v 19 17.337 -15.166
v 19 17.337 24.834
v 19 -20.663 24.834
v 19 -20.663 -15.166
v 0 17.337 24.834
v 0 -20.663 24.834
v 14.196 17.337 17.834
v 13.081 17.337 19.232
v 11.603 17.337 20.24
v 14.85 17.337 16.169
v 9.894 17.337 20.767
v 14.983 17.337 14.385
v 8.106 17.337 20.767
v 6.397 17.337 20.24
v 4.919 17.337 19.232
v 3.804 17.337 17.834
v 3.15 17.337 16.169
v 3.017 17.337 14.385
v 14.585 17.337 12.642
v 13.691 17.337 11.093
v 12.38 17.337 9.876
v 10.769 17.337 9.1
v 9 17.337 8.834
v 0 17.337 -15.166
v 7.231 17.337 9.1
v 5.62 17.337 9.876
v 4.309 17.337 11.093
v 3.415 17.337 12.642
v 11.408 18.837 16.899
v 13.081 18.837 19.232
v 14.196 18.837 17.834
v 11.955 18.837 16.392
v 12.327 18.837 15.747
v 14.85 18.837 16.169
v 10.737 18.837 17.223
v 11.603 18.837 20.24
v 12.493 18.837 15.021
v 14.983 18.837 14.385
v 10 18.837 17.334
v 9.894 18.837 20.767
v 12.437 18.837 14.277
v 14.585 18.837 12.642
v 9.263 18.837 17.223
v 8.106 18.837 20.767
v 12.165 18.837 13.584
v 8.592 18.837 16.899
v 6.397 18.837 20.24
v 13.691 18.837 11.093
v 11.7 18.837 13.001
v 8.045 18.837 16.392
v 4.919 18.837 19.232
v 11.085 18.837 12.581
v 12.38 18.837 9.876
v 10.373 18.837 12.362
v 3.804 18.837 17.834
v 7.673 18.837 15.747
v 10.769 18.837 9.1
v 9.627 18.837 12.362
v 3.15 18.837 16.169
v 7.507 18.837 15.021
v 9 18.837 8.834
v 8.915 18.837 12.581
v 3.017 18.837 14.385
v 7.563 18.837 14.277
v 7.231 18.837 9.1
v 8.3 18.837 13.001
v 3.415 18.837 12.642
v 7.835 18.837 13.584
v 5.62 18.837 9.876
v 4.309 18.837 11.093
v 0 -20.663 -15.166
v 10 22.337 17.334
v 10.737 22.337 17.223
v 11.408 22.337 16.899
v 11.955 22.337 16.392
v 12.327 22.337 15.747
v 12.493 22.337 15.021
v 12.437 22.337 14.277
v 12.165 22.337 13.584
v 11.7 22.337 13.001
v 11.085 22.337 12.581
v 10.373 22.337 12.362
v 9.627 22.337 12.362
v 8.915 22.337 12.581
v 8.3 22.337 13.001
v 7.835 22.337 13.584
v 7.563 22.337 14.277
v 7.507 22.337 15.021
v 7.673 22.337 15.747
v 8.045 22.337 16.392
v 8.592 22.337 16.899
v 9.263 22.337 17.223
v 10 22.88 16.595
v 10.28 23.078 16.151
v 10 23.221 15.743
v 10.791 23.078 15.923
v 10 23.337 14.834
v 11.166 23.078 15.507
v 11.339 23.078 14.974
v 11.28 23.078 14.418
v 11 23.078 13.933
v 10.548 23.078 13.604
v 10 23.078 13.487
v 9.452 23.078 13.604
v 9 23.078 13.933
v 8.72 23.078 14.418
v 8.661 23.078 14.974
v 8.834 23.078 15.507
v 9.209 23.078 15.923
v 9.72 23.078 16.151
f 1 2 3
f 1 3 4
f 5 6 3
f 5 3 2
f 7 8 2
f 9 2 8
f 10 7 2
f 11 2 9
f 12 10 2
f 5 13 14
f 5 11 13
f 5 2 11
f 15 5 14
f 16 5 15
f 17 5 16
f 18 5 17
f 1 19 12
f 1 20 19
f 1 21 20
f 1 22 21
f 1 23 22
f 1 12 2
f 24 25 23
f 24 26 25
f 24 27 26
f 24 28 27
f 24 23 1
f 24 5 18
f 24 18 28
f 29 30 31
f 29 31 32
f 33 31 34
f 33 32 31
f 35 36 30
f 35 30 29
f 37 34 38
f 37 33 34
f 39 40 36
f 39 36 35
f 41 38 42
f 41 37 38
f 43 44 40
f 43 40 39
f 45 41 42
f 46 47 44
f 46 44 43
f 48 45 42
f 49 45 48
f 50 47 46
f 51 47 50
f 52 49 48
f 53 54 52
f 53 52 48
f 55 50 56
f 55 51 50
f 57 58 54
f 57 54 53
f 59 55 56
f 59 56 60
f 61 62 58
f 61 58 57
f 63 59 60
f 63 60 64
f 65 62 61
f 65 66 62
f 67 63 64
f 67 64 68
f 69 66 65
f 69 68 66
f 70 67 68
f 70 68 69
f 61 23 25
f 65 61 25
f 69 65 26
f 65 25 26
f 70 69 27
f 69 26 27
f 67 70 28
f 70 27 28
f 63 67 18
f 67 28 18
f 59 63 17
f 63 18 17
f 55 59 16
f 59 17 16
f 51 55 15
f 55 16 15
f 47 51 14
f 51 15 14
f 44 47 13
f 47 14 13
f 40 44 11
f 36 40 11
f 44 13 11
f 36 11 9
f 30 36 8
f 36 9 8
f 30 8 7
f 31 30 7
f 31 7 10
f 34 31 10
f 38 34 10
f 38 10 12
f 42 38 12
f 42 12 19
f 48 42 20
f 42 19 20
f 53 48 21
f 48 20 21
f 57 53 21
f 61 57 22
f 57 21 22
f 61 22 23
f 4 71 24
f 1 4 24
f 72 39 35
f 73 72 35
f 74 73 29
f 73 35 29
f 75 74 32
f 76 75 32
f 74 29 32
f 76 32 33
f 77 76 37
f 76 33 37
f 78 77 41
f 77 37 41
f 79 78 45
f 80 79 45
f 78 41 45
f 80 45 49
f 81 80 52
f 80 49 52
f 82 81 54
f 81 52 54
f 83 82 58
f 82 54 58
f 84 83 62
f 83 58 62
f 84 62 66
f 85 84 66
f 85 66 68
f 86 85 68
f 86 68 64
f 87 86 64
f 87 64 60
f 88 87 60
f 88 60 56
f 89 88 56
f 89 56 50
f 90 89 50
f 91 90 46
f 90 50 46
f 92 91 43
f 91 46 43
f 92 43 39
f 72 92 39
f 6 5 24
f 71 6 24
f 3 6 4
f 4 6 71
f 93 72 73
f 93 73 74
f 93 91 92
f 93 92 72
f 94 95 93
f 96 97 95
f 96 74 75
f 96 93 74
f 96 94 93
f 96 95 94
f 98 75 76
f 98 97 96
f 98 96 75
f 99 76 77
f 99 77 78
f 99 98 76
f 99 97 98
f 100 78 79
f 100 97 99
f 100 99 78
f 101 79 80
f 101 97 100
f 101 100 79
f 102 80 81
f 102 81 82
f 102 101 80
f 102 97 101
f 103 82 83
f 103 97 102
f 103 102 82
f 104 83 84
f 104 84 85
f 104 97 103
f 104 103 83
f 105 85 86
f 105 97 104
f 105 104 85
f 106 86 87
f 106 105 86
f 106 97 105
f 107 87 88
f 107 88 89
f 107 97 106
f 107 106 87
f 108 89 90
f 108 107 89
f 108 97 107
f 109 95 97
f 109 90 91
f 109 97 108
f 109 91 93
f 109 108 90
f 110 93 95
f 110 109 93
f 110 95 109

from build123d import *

# Parameters (mm, degrees)
ESQUISSE1_W       = 40
ESQUISSE1_H       = 38
EXTRUSION1_DEPTH  = 19
ESQUISSE2_R       = 6
EXTRUSION2_DEPTH  = 1.5
ESQUISSE3_R       = 2.5
EXTRUSION3_DEPTH  = 3.5
D_ME1_FACE_RADIUS = 2.5
D_ME1_HEIGHT      = 1


with BuildPart() as part:
    # Esquisse1 → Extrusion1 (new body)
    with BuildSketch(Plane(origin=(0, 0, 0), x_dir=(0, 0, -1), z_dir=(1, 0, 0))):
        with Locations((-4.8337322, -1.663178935)):
            Rectangle(ESQUISSE1_W, ESQUISSE1_H)
    extrude(amount=EXTRUSION1_DEPTH)

    # Esquisse2 → Extrusion2 (add)
    with BuildSketch(Plane(origin=(0, 17.336821065, 0), x_dir=(1, 0, 0), z_dir=(0, 1, 0))):
        with Locations(Location((9, -14.8337322, 0), (0, 0, 90))):
            Circle(ESQUISSE2_R)
    extrude(amount=EXTRUSION2_DEPTH)

    # Esquisse3 → Extrusion3 (add)
    with BuildSketch(Plane(origin=(0, 18.836821065, 0), x_dir=(-1, 0, 0), z_dir=(0, 1, 0))):
        with Locations(Location((-10, 14.8337322, 0), (0, 0, 90))):
            Circle(ESQUISSE3_R)
    extrude(amount=EXTRUSION3_DEPTH)

    # Dôme1: a dome of height H over a round flat face of radius A is a cap of a sphere of radius (A * A + H * H) / (2 * H)
    d_me1_r = (D_ME1_FACE_RADIUS * D_ME1_FACE_RADIUS + D_ME1_HEIGHT * D_ME1_HEIGHT) / (2 * D_ME1_HEIGHT)
    d_me1_base = Plane((10, 22.336821065, 14.8337322), z_dir=(0, 1, 0))
    with Locations(d_me1_base.offset(D_ME1_HEIGHT - d_me1_r)):
        d_me1_ball = Sphere(d_me1_r, mode=Mode.PRIVATE)
    add(split(d_me1_ball, bisect_by=d_me1_base, keep=Keep.TOP, mode=Mode.PRIVATE))


solid = part.part
